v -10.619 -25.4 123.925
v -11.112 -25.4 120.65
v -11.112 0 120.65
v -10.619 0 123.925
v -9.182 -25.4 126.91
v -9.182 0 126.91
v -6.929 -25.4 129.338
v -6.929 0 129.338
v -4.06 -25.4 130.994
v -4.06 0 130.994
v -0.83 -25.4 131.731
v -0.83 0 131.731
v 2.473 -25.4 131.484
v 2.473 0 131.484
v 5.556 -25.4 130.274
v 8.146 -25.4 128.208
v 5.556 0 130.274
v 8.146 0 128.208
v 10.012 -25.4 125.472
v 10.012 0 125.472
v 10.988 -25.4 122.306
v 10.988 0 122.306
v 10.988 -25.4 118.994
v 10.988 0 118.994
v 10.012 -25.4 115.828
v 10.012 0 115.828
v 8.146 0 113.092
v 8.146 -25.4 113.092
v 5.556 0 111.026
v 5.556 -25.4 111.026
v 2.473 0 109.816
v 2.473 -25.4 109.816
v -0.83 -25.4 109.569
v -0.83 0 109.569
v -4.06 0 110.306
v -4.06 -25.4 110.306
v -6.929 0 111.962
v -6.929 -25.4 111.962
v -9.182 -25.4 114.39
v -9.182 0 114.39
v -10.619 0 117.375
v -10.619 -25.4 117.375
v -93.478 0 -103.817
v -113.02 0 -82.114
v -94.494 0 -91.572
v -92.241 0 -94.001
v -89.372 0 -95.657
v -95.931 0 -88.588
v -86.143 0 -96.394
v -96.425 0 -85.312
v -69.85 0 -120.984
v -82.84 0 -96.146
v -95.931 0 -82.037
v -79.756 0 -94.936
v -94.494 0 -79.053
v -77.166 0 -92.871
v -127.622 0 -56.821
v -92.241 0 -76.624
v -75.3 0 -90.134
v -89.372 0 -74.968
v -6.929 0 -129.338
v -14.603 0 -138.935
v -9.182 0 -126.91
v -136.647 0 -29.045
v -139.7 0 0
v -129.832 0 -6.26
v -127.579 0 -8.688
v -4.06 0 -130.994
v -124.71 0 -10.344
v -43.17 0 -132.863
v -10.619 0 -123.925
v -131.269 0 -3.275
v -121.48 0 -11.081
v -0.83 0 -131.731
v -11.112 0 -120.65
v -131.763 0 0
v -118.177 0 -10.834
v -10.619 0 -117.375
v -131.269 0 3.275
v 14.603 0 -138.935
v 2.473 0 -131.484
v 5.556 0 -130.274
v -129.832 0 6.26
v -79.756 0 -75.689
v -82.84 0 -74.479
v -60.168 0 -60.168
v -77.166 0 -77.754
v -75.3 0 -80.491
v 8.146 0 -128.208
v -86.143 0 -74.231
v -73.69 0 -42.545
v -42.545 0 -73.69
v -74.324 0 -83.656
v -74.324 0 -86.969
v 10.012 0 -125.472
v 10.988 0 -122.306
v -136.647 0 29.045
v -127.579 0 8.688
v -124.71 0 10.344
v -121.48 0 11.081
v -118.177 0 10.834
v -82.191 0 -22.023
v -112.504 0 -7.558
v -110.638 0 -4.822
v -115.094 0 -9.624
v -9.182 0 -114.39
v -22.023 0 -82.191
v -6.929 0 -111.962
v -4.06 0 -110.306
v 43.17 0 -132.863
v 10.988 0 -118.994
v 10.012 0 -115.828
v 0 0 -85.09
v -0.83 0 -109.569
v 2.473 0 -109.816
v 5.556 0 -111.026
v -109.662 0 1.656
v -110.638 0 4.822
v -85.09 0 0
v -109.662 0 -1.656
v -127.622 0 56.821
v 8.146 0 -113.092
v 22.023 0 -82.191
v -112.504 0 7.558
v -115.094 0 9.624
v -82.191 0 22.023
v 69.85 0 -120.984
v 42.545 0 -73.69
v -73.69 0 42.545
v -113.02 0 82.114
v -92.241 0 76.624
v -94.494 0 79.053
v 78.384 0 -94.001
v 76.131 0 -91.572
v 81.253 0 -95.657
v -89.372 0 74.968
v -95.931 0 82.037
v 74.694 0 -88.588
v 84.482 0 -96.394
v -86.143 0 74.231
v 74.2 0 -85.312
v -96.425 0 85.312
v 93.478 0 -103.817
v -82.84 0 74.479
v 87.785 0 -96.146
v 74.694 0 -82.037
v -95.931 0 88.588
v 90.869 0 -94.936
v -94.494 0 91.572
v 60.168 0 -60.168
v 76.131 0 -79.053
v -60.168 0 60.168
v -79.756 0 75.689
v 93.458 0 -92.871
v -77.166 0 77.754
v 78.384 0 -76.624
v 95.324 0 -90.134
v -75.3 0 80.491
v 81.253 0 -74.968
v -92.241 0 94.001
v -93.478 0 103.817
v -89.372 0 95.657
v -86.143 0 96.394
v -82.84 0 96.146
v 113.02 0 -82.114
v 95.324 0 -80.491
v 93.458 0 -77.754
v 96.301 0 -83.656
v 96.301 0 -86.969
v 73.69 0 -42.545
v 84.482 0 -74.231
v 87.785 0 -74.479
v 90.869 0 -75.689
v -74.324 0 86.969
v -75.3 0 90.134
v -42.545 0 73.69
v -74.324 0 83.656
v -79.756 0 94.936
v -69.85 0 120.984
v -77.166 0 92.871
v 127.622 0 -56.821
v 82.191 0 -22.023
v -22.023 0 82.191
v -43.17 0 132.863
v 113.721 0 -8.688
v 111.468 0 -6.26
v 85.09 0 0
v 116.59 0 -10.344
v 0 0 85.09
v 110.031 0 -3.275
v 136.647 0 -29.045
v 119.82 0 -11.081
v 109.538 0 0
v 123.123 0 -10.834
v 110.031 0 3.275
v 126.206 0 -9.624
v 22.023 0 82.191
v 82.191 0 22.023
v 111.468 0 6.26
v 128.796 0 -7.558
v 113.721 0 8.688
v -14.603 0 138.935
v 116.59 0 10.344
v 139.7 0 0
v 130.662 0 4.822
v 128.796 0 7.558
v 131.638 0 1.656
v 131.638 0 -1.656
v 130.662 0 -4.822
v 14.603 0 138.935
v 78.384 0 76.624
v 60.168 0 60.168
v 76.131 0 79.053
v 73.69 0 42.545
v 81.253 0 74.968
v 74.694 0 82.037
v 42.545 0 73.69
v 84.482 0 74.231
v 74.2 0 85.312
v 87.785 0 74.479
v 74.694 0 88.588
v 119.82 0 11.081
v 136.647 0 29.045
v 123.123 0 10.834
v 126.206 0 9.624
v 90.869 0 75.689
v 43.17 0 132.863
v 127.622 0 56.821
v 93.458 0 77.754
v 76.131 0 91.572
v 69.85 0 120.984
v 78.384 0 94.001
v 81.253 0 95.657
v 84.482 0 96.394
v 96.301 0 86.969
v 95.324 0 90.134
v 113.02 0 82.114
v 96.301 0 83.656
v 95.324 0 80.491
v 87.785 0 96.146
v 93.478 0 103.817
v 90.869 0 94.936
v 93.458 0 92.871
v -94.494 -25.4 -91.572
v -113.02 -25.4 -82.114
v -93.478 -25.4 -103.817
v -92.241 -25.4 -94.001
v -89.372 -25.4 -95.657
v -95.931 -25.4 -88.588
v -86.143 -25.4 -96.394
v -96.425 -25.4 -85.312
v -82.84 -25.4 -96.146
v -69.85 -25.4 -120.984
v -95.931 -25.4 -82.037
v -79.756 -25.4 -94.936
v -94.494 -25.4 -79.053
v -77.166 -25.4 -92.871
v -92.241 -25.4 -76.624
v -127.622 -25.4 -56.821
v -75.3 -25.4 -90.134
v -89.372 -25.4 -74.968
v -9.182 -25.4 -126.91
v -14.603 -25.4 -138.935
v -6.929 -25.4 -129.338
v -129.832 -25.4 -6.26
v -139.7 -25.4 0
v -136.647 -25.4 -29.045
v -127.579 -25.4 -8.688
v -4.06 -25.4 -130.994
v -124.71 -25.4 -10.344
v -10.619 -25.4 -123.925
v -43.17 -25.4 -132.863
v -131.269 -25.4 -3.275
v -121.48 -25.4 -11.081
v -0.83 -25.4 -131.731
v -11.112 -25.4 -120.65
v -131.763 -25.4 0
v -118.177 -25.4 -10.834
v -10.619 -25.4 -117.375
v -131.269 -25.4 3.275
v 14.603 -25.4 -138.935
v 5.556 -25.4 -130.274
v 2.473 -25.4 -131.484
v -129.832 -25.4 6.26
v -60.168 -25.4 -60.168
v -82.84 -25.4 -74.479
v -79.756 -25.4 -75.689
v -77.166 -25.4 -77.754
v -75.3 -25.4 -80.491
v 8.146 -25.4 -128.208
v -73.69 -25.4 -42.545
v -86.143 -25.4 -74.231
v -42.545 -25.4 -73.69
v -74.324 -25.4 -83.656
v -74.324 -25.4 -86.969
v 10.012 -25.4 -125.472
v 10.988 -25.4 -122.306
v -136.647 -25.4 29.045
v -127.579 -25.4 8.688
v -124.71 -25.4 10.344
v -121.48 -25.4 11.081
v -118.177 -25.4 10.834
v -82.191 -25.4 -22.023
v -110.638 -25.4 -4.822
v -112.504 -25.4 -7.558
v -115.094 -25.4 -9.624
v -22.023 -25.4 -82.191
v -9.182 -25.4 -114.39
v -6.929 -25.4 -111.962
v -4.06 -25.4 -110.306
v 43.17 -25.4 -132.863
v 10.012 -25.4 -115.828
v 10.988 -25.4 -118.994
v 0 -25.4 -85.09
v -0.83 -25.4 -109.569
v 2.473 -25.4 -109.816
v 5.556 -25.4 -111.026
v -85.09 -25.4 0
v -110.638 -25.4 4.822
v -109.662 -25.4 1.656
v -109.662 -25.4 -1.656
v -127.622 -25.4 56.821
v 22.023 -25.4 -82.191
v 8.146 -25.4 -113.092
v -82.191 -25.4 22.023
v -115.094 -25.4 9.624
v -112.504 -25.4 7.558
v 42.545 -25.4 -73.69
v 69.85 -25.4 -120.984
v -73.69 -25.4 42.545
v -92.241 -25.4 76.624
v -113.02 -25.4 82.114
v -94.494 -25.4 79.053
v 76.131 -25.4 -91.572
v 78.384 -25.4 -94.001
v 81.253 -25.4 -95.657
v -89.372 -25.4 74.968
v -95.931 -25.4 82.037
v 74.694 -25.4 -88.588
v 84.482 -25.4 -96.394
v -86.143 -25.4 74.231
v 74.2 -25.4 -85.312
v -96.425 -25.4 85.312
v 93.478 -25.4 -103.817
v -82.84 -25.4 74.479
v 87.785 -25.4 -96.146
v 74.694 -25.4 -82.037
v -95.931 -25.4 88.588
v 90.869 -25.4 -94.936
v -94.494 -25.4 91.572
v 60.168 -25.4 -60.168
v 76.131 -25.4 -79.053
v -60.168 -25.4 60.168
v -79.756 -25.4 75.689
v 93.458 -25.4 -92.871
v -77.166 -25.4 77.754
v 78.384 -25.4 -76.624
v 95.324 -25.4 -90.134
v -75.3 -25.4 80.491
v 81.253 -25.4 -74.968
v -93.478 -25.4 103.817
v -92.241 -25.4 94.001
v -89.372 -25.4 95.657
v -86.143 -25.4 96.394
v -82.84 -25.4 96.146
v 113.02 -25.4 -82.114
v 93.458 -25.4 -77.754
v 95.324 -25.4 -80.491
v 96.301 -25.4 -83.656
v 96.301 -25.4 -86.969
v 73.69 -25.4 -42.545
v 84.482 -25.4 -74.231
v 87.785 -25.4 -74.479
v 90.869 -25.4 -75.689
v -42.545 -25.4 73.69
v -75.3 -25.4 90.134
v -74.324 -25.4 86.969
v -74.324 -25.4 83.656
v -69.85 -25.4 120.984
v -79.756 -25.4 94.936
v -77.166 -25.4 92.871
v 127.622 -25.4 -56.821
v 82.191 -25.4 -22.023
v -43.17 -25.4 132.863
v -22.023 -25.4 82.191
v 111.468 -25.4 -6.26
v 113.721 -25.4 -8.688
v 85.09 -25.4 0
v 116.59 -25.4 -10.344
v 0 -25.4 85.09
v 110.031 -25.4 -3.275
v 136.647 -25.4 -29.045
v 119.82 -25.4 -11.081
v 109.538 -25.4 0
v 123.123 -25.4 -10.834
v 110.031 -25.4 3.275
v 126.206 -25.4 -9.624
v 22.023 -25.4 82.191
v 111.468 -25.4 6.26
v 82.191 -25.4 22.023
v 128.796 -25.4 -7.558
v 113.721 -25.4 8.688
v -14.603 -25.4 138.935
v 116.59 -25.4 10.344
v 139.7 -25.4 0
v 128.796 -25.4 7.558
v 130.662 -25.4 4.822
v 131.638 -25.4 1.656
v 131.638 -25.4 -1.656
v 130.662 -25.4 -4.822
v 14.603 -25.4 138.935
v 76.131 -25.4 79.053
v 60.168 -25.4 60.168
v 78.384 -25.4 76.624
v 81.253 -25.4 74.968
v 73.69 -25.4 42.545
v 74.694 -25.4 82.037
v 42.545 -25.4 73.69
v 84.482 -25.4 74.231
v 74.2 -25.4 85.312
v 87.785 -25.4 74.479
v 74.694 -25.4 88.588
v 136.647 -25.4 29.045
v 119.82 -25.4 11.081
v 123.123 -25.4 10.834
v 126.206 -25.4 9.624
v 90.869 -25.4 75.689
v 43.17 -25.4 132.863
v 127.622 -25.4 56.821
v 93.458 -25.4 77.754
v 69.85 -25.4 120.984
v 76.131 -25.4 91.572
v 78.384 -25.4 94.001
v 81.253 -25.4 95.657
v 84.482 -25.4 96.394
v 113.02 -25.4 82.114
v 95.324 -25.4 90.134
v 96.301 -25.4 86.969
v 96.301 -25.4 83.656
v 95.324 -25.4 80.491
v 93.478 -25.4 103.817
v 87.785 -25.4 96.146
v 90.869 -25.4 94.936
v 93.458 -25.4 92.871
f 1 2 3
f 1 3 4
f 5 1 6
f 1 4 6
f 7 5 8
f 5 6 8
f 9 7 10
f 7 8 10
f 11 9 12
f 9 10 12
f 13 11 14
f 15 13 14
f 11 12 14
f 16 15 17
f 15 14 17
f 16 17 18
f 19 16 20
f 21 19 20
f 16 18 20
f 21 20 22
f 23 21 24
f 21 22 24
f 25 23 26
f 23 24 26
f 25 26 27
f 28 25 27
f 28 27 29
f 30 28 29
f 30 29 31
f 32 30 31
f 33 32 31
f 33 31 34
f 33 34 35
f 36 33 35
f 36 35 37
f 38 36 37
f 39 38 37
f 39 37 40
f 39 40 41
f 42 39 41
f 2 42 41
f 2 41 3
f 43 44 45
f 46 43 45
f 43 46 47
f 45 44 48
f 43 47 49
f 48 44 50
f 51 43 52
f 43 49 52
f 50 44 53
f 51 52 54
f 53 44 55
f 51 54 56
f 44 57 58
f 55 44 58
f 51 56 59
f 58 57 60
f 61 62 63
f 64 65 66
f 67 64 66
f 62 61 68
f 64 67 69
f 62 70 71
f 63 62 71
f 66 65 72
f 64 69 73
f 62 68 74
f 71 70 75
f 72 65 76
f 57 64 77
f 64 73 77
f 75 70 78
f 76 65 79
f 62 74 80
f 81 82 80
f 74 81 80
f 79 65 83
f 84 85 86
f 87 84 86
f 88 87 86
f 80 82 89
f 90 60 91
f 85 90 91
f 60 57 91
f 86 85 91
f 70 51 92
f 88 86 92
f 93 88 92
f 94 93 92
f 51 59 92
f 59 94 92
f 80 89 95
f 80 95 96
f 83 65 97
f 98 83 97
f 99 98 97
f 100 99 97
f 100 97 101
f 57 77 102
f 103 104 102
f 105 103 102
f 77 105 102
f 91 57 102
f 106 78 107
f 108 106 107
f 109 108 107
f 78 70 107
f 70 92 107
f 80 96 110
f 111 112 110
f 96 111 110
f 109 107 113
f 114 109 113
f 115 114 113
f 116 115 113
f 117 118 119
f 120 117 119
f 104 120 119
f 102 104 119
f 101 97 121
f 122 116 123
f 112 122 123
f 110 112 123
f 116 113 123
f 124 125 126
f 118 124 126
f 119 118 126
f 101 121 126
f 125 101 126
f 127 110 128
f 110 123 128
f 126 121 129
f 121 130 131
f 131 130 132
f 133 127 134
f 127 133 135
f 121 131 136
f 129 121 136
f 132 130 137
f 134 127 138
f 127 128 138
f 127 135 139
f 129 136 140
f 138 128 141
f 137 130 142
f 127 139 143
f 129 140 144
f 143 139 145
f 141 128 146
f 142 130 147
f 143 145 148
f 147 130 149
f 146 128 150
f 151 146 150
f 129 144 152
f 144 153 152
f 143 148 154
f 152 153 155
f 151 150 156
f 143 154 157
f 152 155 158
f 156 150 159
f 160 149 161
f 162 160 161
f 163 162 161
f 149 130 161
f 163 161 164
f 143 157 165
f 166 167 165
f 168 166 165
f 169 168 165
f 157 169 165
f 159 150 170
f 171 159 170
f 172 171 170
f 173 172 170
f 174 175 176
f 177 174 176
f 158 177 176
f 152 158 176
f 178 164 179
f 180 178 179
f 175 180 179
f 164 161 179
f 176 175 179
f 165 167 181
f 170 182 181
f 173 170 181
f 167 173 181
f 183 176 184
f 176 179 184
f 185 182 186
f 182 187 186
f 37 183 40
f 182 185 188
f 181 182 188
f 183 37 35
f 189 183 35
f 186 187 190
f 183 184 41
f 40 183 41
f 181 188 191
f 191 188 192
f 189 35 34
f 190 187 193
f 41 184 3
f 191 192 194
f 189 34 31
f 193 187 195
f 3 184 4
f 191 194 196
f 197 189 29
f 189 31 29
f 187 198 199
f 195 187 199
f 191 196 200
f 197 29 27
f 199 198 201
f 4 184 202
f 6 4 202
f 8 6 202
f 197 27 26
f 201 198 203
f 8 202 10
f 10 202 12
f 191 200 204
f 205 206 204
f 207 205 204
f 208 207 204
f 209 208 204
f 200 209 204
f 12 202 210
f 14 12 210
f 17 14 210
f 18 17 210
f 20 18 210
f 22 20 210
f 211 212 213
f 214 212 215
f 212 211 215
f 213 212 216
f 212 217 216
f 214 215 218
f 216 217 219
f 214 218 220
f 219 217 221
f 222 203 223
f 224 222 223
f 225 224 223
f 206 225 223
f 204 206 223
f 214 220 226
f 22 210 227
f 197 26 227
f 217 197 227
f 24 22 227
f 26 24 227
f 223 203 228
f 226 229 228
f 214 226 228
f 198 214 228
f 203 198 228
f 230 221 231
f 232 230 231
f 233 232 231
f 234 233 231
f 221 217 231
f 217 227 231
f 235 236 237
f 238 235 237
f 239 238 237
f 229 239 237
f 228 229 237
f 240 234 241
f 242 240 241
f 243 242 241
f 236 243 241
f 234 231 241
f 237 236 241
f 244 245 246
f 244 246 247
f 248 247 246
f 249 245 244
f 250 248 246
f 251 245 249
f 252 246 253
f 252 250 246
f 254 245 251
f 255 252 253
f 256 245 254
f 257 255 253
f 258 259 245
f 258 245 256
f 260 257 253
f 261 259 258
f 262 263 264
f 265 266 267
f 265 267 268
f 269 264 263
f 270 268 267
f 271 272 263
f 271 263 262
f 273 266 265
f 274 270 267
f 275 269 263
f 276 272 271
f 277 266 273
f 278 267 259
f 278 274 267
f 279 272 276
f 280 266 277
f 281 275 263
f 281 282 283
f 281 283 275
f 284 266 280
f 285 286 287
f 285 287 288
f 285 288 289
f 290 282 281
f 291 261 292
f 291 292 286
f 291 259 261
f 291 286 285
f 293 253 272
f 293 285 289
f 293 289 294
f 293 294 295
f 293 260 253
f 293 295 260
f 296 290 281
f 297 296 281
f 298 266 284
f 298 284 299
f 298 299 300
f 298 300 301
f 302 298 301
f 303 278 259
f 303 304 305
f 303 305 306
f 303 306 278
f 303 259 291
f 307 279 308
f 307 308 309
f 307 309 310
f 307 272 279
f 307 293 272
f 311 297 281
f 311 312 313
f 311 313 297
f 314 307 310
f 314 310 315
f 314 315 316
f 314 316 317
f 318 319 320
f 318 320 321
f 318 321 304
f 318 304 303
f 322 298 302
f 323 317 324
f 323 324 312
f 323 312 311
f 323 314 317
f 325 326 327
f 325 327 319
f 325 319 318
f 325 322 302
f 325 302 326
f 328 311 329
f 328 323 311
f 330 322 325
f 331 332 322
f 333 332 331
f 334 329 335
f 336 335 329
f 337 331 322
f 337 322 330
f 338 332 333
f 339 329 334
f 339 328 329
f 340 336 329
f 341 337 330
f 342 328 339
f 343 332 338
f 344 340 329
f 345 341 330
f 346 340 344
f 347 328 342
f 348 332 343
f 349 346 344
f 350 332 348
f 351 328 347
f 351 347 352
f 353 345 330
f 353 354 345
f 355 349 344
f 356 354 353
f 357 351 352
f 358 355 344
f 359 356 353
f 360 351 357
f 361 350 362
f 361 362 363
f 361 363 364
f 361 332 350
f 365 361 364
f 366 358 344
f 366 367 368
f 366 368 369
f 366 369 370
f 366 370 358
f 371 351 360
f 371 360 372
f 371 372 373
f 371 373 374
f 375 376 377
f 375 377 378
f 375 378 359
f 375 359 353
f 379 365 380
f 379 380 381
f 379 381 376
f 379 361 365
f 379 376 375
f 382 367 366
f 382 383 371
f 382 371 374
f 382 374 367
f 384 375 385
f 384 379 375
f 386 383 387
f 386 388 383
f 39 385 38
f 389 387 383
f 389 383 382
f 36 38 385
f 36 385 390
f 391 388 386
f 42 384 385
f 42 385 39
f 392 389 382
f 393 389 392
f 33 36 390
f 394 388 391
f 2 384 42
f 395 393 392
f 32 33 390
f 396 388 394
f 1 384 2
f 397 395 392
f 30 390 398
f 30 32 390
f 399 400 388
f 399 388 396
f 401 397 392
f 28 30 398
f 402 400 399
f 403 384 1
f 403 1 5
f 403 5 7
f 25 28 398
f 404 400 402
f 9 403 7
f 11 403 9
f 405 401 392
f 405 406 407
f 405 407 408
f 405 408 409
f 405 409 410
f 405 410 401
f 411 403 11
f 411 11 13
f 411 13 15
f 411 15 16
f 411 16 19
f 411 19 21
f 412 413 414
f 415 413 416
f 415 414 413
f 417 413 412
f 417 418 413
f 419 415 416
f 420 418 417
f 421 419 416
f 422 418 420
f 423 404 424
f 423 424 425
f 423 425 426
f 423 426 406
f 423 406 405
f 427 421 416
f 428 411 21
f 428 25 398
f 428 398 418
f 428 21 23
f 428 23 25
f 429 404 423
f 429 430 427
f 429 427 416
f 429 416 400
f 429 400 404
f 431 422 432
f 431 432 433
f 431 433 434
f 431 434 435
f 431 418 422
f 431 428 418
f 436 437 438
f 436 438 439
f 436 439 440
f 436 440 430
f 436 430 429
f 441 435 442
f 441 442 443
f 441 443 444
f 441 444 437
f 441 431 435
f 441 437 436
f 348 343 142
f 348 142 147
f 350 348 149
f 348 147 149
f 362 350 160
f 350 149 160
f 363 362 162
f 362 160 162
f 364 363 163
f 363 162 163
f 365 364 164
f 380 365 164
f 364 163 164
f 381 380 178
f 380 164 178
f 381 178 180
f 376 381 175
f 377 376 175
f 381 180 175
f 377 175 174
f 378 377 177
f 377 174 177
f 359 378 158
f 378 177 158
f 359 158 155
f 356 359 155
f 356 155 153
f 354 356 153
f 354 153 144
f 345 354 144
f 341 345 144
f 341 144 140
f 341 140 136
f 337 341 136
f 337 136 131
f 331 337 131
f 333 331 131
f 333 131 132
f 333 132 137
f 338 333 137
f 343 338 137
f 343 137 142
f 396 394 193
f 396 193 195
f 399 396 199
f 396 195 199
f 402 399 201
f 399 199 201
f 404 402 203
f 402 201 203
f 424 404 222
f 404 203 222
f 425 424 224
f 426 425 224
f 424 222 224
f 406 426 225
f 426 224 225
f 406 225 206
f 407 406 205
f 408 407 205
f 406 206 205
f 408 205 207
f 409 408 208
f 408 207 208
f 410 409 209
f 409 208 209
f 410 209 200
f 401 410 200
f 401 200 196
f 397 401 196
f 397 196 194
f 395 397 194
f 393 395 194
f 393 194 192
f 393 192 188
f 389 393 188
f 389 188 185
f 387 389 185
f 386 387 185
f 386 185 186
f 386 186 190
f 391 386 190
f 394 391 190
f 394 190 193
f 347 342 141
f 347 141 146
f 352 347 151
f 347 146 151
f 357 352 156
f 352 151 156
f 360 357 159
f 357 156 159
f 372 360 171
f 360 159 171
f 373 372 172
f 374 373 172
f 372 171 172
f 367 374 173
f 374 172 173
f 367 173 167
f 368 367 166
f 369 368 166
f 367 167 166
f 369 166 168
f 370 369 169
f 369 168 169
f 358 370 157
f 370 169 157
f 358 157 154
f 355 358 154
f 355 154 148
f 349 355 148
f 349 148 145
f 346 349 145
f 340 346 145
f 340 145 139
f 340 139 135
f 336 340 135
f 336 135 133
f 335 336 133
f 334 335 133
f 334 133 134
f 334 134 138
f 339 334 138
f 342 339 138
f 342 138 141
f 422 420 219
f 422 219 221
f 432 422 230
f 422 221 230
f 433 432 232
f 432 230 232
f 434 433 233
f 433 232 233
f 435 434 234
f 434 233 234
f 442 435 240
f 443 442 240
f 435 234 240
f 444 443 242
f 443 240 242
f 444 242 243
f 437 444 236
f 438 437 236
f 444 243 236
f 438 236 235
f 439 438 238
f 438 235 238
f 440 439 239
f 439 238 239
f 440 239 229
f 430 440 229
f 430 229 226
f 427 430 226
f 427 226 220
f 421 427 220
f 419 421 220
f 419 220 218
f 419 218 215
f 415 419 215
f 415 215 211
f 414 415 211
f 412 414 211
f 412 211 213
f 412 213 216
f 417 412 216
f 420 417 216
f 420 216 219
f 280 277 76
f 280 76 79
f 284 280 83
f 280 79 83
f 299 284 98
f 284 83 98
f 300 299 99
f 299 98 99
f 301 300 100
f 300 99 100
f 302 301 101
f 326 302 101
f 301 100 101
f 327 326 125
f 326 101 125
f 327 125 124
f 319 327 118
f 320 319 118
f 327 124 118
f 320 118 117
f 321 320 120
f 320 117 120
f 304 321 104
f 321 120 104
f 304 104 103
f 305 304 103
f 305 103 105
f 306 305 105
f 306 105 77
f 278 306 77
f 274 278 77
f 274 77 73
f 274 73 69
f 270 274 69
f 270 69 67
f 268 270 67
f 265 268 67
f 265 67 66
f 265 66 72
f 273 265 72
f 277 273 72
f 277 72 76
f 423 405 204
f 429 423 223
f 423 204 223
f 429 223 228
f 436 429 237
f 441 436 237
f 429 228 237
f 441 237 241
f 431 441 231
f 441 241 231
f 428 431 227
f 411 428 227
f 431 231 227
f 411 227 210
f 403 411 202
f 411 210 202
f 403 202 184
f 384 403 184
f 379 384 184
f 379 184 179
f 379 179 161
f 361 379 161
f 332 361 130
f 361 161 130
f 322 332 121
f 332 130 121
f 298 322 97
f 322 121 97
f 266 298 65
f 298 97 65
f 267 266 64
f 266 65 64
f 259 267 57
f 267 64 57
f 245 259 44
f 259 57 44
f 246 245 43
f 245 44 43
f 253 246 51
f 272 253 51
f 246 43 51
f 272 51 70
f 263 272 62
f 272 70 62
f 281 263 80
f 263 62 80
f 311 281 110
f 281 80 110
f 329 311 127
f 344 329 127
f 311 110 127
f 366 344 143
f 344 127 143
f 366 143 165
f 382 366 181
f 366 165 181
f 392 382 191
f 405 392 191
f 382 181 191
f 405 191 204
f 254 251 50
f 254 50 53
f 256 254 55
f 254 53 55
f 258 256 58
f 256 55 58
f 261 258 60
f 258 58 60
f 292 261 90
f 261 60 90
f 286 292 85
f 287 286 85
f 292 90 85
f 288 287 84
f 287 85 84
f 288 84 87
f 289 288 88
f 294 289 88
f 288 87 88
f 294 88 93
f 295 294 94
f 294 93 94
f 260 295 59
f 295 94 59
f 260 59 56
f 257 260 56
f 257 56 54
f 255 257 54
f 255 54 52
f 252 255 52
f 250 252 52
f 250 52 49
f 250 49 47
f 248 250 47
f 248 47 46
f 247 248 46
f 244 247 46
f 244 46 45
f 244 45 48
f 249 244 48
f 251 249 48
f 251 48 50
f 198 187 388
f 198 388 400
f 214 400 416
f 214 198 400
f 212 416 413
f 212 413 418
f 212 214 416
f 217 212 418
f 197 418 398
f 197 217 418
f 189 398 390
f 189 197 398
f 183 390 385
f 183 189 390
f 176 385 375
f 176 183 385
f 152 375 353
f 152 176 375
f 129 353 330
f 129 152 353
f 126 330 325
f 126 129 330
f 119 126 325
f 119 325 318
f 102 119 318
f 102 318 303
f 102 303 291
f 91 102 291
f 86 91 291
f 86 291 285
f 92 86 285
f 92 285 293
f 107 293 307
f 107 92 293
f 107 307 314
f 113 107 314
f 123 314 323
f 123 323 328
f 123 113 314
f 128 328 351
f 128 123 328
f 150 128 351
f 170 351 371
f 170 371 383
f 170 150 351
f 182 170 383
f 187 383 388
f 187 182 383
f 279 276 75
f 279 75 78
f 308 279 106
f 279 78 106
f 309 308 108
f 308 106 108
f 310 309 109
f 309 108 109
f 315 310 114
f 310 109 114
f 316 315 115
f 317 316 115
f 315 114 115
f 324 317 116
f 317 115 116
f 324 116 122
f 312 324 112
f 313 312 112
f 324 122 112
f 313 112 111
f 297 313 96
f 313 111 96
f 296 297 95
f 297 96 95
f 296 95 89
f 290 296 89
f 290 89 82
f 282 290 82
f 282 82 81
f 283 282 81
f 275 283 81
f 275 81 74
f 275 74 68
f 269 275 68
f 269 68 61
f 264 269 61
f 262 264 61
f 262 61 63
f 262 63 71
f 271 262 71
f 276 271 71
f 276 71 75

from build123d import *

# Parameters (mm, degrees)
F0_R     = 139.7
F0_R_2   = 85.09
F1_DEPTH = 25.4
F3_D     = 22.225


with BuildPart() as f1:
    # F0 (on Front) → F1 (new body)
    with BuildSketch(Plane.XZ):
        Circle(F0_R)
        Circle(F0_R_2, mode=Mode.SUBTRACT)
    extrude(amount=F1_DEPTH)

    # F3 (through all)
    with Locations(Plane.XZ.offset(25.4)):
        with Locations((-85.312433, 85.312433), (0, 120.65), (85.312433, 85.312433), (120.65, 0), (85.312433, -85.312433), (0, -120.65), (-85.312433, -85.312433), (-120.65, 0)):
            Hole(F3_D / 2)


solid = f1.part
